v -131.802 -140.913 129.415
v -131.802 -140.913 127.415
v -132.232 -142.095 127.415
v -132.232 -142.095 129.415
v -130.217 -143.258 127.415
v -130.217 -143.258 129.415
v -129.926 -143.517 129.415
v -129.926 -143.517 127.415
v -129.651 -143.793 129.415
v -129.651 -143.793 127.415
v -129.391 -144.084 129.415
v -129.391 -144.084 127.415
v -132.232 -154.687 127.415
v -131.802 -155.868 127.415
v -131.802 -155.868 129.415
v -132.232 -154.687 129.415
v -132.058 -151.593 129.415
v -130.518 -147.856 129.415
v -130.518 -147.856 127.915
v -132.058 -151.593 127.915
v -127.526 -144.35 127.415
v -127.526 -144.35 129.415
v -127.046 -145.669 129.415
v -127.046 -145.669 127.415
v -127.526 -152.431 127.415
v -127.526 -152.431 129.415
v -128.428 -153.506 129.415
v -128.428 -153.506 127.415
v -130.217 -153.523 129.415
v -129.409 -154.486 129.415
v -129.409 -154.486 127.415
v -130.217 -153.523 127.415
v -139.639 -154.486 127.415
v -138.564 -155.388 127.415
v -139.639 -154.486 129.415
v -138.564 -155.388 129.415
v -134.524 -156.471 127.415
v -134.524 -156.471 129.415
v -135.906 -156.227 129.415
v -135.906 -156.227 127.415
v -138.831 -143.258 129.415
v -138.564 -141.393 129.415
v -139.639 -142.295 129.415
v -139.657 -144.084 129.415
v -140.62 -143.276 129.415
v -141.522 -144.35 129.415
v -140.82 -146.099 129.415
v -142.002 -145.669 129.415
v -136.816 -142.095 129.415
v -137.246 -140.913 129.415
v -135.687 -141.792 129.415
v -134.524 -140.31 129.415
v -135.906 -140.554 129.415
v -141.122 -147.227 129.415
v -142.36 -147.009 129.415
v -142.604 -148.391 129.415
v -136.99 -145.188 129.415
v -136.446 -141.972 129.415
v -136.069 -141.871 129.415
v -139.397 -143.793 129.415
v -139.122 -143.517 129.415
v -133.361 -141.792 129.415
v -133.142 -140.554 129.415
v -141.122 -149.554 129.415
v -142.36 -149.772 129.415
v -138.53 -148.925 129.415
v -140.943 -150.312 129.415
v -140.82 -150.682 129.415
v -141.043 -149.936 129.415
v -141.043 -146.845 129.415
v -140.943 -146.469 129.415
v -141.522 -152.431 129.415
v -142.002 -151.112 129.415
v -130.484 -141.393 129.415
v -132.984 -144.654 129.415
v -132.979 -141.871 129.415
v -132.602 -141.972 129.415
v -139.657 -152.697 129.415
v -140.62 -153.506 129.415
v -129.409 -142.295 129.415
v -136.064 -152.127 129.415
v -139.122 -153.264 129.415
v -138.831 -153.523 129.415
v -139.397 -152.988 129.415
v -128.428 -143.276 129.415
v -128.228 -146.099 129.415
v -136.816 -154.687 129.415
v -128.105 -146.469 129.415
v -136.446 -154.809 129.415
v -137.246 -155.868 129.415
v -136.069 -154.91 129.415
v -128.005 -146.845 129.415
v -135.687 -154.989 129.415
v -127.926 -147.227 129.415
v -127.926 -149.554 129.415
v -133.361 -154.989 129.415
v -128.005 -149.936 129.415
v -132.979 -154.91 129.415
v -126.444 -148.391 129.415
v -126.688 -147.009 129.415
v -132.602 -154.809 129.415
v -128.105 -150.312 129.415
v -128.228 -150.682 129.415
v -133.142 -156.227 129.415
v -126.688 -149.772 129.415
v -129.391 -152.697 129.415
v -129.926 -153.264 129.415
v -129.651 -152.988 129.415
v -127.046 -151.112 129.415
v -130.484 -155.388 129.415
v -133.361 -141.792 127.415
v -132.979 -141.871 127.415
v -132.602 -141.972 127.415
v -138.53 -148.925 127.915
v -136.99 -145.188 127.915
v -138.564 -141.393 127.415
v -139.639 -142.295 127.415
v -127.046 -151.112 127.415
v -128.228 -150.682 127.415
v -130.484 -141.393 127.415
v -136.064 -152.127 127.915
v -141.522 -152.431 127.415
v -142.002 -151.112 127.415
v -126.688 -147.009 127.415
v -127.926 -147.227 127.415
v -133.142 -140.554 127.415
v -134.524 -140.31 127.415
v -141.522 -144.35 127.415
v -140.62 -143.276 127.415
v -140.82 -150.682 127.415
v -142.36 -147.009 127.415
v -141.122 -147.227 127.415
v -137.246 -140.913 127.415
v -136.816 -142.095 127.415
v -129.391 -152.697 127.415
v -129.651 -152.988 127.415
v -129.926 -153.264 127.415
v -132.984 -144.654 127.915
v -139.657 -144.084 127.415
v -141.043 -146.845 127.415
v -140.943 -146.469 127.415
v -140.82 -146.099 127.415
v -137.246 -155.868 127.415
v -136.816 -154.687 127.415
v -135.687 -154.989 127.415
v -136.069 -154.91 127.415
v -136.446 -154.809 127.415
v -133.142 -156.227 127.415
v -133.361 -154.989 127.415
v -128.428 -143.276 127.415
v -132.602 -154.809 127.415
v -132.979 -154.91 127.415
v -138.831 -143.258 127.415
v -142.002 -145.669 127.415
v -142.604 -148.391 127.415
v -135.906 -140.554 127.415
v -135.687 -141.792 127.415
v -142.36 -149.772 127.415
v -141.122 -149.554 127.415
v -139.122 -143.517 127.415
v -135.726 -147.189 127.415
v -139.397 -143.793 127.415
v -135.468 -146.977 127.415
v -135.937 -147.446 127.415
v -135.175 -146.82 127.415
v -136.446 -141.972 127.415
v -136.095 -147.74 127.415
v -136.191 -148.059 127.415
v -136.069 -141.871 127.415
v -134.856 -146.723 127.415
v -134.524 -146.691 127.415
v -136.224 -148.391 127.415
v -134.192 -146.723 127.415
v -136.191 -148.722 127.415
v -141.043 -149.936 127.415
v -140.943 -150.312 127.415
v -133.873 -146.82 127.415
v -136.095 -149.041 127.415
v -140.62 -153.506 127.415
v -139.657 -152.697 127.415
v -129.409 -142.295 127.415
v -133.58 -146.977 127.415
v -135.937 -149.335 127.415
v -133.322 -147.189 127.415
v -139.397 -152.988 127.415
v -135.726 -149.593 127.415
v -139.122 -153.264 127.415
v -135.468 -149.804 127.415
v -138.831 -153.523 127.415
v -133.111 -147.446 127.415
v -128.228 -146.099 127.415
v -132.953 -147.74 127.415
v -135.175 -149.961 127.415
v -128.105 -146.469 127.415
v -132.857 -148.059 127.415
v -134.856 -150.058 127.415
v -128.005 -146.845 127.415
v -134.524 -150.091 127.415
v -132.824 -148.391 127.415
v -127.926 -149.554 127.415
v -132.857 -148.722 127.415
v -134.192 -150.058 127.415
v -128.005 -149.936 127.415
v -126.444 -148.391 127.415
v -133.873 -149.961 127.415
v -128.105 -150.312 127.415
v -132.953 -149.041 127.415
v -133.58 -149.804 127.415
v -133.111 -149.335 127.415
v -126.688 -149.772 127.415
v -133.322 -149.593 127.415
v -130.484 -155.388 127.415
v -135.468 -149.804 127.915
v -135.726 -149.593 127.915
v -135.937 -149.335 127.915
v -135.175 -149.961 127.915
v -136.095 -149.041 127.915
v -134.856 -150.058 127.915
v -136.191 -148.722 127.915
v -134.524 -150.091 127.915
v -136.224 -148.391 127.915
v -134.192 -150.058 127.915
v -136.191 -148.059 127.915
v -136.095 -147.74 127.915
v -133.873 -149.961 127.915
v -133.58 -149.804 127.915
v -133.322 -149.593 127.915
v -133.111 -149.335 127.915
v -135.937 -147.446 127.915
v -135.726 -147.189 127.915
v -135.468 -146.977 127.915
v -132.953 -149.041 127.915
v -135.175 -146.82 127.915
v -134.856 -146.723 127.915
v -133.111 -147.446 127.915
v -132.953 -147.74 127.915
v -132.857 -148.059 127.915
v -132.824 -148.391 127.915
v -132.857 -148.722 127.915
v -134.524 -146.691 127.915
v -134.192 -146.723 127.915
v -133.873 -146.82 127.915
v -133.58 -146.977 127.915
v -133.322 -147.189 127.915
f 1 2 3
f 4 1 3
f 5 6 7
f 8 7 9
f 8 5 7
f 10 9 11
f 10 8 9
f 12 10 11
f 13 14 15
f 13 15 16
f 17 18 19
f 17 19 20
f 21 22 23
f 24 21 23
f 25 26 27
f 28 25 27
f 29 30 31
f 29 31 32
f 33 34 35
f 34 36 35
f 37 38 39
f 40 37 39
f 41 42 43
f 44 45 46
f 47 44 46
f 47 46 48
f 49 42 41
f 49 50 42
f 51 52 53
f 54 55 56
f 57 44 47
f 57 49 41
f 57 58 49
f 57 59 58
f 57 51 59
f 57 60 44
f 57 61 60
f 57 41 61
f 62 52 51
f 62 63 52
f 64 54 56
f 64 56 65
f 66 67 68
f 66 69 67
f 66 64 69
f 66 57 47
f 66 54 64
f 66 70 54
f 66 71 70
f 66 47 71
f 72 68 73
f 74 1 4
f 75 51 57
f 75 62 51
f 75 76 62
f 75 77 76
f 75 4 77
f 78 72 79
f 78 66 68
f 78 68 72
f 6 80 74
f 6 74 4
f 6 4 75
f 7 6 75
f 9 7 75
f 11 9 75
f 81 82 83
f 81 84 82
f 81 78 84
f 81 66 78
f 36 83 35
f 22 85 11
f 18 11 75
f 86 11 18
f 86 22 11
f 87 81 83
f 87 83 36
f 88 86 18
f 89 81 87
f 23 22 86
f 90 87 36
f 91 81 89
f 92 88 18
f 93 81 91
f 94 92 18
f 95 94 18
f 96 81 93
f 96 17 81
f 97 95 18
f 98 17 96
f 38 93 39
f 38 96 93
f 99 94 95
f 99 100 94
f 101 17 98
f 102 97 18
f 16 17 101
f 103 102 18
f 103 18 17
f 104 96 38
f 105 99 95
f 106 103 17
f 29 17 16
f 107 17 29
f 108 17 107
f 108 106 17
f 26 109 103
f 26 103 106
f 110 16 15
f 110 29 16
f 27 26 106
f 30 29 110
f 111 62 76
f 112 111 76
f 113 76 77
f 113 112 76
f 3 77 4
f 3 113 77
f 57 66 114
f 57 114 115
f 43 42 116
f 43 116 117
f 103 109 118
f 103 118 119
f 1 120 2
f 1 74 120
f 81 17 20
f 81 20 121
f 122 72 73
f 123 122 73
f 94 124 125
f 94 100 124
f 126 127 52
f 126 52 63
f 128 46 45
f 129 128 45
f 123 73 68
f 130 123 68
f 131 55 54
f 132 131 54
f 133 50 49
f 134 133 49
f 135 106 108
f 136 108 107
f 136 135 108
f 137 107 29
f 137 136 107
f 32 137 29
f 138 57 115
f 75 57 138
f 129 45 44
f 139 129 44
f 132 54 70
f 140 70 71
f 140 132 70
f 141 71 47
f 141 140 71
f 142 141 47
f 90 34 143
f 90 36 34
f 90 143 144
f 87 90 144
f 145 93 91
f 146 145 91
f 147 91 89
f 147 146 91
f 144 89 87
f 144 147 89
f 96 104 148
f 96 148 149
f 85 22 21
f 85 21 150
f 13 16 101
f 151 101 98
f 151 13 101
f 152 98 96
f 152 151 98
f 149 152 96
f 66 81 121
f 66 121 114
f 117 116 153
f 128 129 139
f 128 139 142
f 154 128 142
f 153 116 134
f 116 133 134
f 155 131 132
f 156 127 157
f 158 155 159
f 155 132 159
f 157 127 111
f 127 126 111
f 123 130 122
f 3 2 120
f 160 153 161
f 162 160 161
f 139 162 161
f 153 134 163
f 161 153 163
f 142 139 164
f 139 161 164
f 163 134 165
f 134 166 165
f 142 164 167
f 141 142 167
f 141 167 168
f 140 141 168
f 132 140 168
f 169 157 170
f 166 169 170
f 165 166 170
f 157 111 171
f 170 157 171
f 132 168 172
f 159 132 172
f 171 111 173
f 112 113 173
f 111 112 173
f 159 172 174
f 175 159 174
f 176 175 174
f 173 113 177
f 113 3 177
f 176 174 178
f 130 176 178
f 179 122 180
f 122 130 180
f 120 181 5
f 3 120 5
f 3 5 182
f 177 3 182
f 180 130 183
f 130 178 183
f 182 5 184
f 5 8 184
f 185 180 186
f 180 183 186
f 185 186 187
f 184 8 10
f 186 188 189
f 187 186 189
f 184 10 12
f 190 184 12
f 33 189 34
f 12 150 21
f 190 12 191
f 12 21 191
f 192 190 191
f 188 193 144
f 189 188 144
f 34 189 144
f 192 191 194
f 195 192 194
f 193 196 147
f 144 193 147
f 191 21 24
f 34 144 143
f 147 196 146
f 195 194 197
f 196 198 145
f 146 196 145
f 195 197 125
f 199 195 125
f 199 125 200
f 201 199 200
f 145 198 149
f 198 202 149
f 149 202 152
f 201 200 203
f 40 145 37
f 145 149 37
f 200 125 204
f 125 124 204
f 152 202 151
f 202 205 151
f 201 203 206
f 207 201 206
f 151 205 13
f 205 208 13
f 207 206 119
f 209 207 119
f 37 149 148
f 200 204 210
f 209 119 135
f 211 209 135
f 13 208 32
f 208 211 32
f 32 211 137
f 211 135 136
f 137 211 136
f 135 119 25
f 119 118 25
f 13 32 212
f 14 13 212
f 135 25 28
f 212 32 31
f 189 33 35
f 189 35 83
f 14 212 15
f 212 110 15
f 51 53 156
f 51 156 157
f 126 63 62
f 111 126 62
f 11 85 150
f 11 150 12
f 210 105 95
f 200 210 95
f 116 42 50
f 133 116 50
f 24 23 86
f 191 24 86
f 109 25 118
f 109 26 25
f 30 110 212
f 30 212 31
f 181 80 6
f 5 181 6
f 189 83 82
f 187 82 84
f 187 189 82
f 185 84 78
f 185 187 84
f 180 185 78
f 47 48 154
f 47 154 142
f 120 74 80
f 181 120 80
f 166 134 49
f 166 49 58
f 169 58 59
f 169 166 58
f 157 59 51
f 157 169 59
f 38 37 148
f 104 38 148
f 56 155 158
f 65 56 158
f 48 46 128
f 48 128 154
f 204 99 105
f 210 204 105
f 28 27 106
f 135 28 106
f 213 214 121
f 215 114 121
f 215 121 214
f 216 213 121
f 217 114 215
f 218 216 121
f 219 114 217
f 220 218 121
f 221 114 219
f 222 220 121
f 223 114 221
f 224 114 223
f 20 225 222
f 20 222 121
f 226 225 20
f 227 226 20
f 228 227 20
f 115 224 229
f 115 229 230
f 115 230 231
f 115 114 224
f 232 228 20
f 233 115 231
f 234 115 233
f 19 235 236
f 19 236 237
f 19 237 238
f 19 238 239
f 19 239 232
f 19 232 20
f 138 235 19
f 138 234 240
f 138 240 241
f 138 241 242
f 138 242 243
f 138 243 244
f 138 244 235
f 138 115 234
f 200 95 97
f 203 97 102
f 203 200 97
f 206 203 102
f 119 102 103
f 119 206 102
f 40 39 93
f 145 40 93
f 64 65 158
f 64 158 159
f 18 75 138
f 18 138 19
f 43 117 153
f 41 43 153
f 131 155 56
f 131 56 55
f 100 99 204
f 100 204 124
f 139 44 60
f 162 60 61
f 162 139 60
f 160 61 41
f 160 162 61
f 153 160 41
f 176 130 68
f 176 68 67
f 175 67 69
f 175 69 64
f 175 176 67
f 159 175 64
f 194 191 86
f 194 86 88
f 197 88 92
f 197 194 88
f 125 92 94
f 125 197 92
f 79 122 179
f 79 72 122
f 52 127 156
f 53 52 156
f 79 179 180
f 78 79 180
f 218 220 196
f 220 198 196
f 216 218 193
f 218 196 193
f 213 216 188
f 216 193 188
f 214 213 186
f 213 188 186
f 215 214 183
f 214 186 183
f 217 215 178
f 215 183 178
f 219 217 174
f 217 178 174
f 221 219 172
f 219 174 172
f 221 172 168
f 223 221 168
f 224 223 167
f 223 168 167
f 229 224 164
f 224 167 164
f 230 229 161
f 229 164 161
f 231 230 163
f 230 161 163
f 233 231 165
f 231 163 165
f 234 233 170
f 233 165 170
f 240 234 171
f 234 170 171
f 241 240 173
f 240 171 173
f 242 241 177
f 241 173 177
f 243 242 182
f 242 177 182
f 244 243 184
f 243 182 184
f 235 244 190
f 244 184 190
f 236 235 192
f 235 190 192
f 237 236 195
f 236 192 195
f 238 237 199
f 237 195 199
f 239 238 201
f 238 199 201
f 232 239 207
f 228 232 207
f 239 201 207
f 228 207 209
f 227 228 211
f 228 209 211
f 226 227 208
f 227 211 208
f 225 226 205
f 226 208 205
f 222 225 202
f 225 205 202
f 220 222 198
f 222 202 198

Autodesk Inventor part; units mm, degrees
ref_plane "YZ Plane" through (0, 0, 0) normal (1, 0, 0) x (0, 1, 0)
ref_plane "XZ Plane" through (0, 0, 0) normal (0, 1, 0) x (-1, 0, 0)
ref_plane "XY Plane" through (0, 0, 0) normal (0, 0, 1) x (1, 0, 0)
ref_plane "Work Plane1" through (-89.269, -103.4593, 127.4153) normal (0, 0, 1) x (0, -1, 0)
sketch "Sketch1" plane through (-89.269, -103.4593, 127.4153) normal (0, 0, 1) x (0, -1, 0)
  circle A0 centre (44.9313, -45.255) radius 1.4 construction
  circle A1 centre (44.9313, -45.255) radius 1.7
  circle A2 centre (44.9313, -45.255) radius 6.7
  point P0 (-103.4593, 89.269)
  dimension "d0" = 0.3
  dimension "d1" = 5
extrude "Extrusion1" add sketch "Sketch1" along normal blind 2
sketch "Sketch2" plane through (-134.524, -148.3906, 129.4153) normal (0, 0, 1) x (1, 0, 0)
  circle A0 centre (0, 0) radius 1.7 projected
  circle A1 centre (0, 0) radius 6.7 projected
  line L0 (-6.7, 0) -> (-8.0802, 0)
  line L1 (-8.0802, 0) -> (-7.8365, -1.3818)
  line L2 (-7.8365, -1.3818) -> (-6.5982, -1.1634)
  circle A2 centre (0, 0) radius 6.7 projected
  line L3 (0, 0) -> (-6.5982, -1.1634)
  line L4 (0, 0) -> (-6.7, 0)
  line L5 (0, 0) -> (6.7, 0) construction
  line L6 (-8.0802, 0) -> (-7.8365, 1.3818)
  line L7 (-7.8365, 1.3818) -> (-6.5982, 1.1634)
  arc A3 (-6.5982, 1.1634) -> (-6.5982, -1.1634) centre (0, 0) ccw
  point P0 (134.524, 148.3906)
  dimension "d4" = 180
  dimension "d7" = 10
extrude "Extrusion2" add sketch "Sketch2" against normal up to surface (2 mm away) contours L0 L6 L7 A1 | A1 L2 L1 L0
pattern_circular "Circular Pattern1" count 12 over 360 about axis through (-134.524, -148.3906, 127.4153) along (0, 0, 1) of "Extrusion2"
sketch "Sketch3" plane through (-89.269, -103.4593, 129.4153) normal (0, 0, 1) x (1, 0, 0)
  circle A0 centre (-45.255, -44.9313) radius 2.45 projected
  line L0 (-42.7892, -48.1333) -> (-46.7952, -48.6677)
  line L1 (-46.7952, -48.6677) -> (-49.261, -45.4657)
  line L2 (-49.261, -45.4657) -> (-47.7208, -41.7292)
  line L3 (-47.7208, -41.7292) -> (-43.7148, -41.1948)
  line L4 (-43.7148, -41.1948) -> (-41.249, -44.3969)
  line L5 (-41.249, -44.3969) -> (-42.7892, -48.1333)
  point P0 (89.269, 103.4593)
  dimension "d11" = 7
extrude "Extrusion3" cut sketch "Sketch3" against normal blind 1.5 contours A0 | L0 L1 L2 L3 L4 L5
properties part number "cellSTORM_screw_ring_adjuster"
